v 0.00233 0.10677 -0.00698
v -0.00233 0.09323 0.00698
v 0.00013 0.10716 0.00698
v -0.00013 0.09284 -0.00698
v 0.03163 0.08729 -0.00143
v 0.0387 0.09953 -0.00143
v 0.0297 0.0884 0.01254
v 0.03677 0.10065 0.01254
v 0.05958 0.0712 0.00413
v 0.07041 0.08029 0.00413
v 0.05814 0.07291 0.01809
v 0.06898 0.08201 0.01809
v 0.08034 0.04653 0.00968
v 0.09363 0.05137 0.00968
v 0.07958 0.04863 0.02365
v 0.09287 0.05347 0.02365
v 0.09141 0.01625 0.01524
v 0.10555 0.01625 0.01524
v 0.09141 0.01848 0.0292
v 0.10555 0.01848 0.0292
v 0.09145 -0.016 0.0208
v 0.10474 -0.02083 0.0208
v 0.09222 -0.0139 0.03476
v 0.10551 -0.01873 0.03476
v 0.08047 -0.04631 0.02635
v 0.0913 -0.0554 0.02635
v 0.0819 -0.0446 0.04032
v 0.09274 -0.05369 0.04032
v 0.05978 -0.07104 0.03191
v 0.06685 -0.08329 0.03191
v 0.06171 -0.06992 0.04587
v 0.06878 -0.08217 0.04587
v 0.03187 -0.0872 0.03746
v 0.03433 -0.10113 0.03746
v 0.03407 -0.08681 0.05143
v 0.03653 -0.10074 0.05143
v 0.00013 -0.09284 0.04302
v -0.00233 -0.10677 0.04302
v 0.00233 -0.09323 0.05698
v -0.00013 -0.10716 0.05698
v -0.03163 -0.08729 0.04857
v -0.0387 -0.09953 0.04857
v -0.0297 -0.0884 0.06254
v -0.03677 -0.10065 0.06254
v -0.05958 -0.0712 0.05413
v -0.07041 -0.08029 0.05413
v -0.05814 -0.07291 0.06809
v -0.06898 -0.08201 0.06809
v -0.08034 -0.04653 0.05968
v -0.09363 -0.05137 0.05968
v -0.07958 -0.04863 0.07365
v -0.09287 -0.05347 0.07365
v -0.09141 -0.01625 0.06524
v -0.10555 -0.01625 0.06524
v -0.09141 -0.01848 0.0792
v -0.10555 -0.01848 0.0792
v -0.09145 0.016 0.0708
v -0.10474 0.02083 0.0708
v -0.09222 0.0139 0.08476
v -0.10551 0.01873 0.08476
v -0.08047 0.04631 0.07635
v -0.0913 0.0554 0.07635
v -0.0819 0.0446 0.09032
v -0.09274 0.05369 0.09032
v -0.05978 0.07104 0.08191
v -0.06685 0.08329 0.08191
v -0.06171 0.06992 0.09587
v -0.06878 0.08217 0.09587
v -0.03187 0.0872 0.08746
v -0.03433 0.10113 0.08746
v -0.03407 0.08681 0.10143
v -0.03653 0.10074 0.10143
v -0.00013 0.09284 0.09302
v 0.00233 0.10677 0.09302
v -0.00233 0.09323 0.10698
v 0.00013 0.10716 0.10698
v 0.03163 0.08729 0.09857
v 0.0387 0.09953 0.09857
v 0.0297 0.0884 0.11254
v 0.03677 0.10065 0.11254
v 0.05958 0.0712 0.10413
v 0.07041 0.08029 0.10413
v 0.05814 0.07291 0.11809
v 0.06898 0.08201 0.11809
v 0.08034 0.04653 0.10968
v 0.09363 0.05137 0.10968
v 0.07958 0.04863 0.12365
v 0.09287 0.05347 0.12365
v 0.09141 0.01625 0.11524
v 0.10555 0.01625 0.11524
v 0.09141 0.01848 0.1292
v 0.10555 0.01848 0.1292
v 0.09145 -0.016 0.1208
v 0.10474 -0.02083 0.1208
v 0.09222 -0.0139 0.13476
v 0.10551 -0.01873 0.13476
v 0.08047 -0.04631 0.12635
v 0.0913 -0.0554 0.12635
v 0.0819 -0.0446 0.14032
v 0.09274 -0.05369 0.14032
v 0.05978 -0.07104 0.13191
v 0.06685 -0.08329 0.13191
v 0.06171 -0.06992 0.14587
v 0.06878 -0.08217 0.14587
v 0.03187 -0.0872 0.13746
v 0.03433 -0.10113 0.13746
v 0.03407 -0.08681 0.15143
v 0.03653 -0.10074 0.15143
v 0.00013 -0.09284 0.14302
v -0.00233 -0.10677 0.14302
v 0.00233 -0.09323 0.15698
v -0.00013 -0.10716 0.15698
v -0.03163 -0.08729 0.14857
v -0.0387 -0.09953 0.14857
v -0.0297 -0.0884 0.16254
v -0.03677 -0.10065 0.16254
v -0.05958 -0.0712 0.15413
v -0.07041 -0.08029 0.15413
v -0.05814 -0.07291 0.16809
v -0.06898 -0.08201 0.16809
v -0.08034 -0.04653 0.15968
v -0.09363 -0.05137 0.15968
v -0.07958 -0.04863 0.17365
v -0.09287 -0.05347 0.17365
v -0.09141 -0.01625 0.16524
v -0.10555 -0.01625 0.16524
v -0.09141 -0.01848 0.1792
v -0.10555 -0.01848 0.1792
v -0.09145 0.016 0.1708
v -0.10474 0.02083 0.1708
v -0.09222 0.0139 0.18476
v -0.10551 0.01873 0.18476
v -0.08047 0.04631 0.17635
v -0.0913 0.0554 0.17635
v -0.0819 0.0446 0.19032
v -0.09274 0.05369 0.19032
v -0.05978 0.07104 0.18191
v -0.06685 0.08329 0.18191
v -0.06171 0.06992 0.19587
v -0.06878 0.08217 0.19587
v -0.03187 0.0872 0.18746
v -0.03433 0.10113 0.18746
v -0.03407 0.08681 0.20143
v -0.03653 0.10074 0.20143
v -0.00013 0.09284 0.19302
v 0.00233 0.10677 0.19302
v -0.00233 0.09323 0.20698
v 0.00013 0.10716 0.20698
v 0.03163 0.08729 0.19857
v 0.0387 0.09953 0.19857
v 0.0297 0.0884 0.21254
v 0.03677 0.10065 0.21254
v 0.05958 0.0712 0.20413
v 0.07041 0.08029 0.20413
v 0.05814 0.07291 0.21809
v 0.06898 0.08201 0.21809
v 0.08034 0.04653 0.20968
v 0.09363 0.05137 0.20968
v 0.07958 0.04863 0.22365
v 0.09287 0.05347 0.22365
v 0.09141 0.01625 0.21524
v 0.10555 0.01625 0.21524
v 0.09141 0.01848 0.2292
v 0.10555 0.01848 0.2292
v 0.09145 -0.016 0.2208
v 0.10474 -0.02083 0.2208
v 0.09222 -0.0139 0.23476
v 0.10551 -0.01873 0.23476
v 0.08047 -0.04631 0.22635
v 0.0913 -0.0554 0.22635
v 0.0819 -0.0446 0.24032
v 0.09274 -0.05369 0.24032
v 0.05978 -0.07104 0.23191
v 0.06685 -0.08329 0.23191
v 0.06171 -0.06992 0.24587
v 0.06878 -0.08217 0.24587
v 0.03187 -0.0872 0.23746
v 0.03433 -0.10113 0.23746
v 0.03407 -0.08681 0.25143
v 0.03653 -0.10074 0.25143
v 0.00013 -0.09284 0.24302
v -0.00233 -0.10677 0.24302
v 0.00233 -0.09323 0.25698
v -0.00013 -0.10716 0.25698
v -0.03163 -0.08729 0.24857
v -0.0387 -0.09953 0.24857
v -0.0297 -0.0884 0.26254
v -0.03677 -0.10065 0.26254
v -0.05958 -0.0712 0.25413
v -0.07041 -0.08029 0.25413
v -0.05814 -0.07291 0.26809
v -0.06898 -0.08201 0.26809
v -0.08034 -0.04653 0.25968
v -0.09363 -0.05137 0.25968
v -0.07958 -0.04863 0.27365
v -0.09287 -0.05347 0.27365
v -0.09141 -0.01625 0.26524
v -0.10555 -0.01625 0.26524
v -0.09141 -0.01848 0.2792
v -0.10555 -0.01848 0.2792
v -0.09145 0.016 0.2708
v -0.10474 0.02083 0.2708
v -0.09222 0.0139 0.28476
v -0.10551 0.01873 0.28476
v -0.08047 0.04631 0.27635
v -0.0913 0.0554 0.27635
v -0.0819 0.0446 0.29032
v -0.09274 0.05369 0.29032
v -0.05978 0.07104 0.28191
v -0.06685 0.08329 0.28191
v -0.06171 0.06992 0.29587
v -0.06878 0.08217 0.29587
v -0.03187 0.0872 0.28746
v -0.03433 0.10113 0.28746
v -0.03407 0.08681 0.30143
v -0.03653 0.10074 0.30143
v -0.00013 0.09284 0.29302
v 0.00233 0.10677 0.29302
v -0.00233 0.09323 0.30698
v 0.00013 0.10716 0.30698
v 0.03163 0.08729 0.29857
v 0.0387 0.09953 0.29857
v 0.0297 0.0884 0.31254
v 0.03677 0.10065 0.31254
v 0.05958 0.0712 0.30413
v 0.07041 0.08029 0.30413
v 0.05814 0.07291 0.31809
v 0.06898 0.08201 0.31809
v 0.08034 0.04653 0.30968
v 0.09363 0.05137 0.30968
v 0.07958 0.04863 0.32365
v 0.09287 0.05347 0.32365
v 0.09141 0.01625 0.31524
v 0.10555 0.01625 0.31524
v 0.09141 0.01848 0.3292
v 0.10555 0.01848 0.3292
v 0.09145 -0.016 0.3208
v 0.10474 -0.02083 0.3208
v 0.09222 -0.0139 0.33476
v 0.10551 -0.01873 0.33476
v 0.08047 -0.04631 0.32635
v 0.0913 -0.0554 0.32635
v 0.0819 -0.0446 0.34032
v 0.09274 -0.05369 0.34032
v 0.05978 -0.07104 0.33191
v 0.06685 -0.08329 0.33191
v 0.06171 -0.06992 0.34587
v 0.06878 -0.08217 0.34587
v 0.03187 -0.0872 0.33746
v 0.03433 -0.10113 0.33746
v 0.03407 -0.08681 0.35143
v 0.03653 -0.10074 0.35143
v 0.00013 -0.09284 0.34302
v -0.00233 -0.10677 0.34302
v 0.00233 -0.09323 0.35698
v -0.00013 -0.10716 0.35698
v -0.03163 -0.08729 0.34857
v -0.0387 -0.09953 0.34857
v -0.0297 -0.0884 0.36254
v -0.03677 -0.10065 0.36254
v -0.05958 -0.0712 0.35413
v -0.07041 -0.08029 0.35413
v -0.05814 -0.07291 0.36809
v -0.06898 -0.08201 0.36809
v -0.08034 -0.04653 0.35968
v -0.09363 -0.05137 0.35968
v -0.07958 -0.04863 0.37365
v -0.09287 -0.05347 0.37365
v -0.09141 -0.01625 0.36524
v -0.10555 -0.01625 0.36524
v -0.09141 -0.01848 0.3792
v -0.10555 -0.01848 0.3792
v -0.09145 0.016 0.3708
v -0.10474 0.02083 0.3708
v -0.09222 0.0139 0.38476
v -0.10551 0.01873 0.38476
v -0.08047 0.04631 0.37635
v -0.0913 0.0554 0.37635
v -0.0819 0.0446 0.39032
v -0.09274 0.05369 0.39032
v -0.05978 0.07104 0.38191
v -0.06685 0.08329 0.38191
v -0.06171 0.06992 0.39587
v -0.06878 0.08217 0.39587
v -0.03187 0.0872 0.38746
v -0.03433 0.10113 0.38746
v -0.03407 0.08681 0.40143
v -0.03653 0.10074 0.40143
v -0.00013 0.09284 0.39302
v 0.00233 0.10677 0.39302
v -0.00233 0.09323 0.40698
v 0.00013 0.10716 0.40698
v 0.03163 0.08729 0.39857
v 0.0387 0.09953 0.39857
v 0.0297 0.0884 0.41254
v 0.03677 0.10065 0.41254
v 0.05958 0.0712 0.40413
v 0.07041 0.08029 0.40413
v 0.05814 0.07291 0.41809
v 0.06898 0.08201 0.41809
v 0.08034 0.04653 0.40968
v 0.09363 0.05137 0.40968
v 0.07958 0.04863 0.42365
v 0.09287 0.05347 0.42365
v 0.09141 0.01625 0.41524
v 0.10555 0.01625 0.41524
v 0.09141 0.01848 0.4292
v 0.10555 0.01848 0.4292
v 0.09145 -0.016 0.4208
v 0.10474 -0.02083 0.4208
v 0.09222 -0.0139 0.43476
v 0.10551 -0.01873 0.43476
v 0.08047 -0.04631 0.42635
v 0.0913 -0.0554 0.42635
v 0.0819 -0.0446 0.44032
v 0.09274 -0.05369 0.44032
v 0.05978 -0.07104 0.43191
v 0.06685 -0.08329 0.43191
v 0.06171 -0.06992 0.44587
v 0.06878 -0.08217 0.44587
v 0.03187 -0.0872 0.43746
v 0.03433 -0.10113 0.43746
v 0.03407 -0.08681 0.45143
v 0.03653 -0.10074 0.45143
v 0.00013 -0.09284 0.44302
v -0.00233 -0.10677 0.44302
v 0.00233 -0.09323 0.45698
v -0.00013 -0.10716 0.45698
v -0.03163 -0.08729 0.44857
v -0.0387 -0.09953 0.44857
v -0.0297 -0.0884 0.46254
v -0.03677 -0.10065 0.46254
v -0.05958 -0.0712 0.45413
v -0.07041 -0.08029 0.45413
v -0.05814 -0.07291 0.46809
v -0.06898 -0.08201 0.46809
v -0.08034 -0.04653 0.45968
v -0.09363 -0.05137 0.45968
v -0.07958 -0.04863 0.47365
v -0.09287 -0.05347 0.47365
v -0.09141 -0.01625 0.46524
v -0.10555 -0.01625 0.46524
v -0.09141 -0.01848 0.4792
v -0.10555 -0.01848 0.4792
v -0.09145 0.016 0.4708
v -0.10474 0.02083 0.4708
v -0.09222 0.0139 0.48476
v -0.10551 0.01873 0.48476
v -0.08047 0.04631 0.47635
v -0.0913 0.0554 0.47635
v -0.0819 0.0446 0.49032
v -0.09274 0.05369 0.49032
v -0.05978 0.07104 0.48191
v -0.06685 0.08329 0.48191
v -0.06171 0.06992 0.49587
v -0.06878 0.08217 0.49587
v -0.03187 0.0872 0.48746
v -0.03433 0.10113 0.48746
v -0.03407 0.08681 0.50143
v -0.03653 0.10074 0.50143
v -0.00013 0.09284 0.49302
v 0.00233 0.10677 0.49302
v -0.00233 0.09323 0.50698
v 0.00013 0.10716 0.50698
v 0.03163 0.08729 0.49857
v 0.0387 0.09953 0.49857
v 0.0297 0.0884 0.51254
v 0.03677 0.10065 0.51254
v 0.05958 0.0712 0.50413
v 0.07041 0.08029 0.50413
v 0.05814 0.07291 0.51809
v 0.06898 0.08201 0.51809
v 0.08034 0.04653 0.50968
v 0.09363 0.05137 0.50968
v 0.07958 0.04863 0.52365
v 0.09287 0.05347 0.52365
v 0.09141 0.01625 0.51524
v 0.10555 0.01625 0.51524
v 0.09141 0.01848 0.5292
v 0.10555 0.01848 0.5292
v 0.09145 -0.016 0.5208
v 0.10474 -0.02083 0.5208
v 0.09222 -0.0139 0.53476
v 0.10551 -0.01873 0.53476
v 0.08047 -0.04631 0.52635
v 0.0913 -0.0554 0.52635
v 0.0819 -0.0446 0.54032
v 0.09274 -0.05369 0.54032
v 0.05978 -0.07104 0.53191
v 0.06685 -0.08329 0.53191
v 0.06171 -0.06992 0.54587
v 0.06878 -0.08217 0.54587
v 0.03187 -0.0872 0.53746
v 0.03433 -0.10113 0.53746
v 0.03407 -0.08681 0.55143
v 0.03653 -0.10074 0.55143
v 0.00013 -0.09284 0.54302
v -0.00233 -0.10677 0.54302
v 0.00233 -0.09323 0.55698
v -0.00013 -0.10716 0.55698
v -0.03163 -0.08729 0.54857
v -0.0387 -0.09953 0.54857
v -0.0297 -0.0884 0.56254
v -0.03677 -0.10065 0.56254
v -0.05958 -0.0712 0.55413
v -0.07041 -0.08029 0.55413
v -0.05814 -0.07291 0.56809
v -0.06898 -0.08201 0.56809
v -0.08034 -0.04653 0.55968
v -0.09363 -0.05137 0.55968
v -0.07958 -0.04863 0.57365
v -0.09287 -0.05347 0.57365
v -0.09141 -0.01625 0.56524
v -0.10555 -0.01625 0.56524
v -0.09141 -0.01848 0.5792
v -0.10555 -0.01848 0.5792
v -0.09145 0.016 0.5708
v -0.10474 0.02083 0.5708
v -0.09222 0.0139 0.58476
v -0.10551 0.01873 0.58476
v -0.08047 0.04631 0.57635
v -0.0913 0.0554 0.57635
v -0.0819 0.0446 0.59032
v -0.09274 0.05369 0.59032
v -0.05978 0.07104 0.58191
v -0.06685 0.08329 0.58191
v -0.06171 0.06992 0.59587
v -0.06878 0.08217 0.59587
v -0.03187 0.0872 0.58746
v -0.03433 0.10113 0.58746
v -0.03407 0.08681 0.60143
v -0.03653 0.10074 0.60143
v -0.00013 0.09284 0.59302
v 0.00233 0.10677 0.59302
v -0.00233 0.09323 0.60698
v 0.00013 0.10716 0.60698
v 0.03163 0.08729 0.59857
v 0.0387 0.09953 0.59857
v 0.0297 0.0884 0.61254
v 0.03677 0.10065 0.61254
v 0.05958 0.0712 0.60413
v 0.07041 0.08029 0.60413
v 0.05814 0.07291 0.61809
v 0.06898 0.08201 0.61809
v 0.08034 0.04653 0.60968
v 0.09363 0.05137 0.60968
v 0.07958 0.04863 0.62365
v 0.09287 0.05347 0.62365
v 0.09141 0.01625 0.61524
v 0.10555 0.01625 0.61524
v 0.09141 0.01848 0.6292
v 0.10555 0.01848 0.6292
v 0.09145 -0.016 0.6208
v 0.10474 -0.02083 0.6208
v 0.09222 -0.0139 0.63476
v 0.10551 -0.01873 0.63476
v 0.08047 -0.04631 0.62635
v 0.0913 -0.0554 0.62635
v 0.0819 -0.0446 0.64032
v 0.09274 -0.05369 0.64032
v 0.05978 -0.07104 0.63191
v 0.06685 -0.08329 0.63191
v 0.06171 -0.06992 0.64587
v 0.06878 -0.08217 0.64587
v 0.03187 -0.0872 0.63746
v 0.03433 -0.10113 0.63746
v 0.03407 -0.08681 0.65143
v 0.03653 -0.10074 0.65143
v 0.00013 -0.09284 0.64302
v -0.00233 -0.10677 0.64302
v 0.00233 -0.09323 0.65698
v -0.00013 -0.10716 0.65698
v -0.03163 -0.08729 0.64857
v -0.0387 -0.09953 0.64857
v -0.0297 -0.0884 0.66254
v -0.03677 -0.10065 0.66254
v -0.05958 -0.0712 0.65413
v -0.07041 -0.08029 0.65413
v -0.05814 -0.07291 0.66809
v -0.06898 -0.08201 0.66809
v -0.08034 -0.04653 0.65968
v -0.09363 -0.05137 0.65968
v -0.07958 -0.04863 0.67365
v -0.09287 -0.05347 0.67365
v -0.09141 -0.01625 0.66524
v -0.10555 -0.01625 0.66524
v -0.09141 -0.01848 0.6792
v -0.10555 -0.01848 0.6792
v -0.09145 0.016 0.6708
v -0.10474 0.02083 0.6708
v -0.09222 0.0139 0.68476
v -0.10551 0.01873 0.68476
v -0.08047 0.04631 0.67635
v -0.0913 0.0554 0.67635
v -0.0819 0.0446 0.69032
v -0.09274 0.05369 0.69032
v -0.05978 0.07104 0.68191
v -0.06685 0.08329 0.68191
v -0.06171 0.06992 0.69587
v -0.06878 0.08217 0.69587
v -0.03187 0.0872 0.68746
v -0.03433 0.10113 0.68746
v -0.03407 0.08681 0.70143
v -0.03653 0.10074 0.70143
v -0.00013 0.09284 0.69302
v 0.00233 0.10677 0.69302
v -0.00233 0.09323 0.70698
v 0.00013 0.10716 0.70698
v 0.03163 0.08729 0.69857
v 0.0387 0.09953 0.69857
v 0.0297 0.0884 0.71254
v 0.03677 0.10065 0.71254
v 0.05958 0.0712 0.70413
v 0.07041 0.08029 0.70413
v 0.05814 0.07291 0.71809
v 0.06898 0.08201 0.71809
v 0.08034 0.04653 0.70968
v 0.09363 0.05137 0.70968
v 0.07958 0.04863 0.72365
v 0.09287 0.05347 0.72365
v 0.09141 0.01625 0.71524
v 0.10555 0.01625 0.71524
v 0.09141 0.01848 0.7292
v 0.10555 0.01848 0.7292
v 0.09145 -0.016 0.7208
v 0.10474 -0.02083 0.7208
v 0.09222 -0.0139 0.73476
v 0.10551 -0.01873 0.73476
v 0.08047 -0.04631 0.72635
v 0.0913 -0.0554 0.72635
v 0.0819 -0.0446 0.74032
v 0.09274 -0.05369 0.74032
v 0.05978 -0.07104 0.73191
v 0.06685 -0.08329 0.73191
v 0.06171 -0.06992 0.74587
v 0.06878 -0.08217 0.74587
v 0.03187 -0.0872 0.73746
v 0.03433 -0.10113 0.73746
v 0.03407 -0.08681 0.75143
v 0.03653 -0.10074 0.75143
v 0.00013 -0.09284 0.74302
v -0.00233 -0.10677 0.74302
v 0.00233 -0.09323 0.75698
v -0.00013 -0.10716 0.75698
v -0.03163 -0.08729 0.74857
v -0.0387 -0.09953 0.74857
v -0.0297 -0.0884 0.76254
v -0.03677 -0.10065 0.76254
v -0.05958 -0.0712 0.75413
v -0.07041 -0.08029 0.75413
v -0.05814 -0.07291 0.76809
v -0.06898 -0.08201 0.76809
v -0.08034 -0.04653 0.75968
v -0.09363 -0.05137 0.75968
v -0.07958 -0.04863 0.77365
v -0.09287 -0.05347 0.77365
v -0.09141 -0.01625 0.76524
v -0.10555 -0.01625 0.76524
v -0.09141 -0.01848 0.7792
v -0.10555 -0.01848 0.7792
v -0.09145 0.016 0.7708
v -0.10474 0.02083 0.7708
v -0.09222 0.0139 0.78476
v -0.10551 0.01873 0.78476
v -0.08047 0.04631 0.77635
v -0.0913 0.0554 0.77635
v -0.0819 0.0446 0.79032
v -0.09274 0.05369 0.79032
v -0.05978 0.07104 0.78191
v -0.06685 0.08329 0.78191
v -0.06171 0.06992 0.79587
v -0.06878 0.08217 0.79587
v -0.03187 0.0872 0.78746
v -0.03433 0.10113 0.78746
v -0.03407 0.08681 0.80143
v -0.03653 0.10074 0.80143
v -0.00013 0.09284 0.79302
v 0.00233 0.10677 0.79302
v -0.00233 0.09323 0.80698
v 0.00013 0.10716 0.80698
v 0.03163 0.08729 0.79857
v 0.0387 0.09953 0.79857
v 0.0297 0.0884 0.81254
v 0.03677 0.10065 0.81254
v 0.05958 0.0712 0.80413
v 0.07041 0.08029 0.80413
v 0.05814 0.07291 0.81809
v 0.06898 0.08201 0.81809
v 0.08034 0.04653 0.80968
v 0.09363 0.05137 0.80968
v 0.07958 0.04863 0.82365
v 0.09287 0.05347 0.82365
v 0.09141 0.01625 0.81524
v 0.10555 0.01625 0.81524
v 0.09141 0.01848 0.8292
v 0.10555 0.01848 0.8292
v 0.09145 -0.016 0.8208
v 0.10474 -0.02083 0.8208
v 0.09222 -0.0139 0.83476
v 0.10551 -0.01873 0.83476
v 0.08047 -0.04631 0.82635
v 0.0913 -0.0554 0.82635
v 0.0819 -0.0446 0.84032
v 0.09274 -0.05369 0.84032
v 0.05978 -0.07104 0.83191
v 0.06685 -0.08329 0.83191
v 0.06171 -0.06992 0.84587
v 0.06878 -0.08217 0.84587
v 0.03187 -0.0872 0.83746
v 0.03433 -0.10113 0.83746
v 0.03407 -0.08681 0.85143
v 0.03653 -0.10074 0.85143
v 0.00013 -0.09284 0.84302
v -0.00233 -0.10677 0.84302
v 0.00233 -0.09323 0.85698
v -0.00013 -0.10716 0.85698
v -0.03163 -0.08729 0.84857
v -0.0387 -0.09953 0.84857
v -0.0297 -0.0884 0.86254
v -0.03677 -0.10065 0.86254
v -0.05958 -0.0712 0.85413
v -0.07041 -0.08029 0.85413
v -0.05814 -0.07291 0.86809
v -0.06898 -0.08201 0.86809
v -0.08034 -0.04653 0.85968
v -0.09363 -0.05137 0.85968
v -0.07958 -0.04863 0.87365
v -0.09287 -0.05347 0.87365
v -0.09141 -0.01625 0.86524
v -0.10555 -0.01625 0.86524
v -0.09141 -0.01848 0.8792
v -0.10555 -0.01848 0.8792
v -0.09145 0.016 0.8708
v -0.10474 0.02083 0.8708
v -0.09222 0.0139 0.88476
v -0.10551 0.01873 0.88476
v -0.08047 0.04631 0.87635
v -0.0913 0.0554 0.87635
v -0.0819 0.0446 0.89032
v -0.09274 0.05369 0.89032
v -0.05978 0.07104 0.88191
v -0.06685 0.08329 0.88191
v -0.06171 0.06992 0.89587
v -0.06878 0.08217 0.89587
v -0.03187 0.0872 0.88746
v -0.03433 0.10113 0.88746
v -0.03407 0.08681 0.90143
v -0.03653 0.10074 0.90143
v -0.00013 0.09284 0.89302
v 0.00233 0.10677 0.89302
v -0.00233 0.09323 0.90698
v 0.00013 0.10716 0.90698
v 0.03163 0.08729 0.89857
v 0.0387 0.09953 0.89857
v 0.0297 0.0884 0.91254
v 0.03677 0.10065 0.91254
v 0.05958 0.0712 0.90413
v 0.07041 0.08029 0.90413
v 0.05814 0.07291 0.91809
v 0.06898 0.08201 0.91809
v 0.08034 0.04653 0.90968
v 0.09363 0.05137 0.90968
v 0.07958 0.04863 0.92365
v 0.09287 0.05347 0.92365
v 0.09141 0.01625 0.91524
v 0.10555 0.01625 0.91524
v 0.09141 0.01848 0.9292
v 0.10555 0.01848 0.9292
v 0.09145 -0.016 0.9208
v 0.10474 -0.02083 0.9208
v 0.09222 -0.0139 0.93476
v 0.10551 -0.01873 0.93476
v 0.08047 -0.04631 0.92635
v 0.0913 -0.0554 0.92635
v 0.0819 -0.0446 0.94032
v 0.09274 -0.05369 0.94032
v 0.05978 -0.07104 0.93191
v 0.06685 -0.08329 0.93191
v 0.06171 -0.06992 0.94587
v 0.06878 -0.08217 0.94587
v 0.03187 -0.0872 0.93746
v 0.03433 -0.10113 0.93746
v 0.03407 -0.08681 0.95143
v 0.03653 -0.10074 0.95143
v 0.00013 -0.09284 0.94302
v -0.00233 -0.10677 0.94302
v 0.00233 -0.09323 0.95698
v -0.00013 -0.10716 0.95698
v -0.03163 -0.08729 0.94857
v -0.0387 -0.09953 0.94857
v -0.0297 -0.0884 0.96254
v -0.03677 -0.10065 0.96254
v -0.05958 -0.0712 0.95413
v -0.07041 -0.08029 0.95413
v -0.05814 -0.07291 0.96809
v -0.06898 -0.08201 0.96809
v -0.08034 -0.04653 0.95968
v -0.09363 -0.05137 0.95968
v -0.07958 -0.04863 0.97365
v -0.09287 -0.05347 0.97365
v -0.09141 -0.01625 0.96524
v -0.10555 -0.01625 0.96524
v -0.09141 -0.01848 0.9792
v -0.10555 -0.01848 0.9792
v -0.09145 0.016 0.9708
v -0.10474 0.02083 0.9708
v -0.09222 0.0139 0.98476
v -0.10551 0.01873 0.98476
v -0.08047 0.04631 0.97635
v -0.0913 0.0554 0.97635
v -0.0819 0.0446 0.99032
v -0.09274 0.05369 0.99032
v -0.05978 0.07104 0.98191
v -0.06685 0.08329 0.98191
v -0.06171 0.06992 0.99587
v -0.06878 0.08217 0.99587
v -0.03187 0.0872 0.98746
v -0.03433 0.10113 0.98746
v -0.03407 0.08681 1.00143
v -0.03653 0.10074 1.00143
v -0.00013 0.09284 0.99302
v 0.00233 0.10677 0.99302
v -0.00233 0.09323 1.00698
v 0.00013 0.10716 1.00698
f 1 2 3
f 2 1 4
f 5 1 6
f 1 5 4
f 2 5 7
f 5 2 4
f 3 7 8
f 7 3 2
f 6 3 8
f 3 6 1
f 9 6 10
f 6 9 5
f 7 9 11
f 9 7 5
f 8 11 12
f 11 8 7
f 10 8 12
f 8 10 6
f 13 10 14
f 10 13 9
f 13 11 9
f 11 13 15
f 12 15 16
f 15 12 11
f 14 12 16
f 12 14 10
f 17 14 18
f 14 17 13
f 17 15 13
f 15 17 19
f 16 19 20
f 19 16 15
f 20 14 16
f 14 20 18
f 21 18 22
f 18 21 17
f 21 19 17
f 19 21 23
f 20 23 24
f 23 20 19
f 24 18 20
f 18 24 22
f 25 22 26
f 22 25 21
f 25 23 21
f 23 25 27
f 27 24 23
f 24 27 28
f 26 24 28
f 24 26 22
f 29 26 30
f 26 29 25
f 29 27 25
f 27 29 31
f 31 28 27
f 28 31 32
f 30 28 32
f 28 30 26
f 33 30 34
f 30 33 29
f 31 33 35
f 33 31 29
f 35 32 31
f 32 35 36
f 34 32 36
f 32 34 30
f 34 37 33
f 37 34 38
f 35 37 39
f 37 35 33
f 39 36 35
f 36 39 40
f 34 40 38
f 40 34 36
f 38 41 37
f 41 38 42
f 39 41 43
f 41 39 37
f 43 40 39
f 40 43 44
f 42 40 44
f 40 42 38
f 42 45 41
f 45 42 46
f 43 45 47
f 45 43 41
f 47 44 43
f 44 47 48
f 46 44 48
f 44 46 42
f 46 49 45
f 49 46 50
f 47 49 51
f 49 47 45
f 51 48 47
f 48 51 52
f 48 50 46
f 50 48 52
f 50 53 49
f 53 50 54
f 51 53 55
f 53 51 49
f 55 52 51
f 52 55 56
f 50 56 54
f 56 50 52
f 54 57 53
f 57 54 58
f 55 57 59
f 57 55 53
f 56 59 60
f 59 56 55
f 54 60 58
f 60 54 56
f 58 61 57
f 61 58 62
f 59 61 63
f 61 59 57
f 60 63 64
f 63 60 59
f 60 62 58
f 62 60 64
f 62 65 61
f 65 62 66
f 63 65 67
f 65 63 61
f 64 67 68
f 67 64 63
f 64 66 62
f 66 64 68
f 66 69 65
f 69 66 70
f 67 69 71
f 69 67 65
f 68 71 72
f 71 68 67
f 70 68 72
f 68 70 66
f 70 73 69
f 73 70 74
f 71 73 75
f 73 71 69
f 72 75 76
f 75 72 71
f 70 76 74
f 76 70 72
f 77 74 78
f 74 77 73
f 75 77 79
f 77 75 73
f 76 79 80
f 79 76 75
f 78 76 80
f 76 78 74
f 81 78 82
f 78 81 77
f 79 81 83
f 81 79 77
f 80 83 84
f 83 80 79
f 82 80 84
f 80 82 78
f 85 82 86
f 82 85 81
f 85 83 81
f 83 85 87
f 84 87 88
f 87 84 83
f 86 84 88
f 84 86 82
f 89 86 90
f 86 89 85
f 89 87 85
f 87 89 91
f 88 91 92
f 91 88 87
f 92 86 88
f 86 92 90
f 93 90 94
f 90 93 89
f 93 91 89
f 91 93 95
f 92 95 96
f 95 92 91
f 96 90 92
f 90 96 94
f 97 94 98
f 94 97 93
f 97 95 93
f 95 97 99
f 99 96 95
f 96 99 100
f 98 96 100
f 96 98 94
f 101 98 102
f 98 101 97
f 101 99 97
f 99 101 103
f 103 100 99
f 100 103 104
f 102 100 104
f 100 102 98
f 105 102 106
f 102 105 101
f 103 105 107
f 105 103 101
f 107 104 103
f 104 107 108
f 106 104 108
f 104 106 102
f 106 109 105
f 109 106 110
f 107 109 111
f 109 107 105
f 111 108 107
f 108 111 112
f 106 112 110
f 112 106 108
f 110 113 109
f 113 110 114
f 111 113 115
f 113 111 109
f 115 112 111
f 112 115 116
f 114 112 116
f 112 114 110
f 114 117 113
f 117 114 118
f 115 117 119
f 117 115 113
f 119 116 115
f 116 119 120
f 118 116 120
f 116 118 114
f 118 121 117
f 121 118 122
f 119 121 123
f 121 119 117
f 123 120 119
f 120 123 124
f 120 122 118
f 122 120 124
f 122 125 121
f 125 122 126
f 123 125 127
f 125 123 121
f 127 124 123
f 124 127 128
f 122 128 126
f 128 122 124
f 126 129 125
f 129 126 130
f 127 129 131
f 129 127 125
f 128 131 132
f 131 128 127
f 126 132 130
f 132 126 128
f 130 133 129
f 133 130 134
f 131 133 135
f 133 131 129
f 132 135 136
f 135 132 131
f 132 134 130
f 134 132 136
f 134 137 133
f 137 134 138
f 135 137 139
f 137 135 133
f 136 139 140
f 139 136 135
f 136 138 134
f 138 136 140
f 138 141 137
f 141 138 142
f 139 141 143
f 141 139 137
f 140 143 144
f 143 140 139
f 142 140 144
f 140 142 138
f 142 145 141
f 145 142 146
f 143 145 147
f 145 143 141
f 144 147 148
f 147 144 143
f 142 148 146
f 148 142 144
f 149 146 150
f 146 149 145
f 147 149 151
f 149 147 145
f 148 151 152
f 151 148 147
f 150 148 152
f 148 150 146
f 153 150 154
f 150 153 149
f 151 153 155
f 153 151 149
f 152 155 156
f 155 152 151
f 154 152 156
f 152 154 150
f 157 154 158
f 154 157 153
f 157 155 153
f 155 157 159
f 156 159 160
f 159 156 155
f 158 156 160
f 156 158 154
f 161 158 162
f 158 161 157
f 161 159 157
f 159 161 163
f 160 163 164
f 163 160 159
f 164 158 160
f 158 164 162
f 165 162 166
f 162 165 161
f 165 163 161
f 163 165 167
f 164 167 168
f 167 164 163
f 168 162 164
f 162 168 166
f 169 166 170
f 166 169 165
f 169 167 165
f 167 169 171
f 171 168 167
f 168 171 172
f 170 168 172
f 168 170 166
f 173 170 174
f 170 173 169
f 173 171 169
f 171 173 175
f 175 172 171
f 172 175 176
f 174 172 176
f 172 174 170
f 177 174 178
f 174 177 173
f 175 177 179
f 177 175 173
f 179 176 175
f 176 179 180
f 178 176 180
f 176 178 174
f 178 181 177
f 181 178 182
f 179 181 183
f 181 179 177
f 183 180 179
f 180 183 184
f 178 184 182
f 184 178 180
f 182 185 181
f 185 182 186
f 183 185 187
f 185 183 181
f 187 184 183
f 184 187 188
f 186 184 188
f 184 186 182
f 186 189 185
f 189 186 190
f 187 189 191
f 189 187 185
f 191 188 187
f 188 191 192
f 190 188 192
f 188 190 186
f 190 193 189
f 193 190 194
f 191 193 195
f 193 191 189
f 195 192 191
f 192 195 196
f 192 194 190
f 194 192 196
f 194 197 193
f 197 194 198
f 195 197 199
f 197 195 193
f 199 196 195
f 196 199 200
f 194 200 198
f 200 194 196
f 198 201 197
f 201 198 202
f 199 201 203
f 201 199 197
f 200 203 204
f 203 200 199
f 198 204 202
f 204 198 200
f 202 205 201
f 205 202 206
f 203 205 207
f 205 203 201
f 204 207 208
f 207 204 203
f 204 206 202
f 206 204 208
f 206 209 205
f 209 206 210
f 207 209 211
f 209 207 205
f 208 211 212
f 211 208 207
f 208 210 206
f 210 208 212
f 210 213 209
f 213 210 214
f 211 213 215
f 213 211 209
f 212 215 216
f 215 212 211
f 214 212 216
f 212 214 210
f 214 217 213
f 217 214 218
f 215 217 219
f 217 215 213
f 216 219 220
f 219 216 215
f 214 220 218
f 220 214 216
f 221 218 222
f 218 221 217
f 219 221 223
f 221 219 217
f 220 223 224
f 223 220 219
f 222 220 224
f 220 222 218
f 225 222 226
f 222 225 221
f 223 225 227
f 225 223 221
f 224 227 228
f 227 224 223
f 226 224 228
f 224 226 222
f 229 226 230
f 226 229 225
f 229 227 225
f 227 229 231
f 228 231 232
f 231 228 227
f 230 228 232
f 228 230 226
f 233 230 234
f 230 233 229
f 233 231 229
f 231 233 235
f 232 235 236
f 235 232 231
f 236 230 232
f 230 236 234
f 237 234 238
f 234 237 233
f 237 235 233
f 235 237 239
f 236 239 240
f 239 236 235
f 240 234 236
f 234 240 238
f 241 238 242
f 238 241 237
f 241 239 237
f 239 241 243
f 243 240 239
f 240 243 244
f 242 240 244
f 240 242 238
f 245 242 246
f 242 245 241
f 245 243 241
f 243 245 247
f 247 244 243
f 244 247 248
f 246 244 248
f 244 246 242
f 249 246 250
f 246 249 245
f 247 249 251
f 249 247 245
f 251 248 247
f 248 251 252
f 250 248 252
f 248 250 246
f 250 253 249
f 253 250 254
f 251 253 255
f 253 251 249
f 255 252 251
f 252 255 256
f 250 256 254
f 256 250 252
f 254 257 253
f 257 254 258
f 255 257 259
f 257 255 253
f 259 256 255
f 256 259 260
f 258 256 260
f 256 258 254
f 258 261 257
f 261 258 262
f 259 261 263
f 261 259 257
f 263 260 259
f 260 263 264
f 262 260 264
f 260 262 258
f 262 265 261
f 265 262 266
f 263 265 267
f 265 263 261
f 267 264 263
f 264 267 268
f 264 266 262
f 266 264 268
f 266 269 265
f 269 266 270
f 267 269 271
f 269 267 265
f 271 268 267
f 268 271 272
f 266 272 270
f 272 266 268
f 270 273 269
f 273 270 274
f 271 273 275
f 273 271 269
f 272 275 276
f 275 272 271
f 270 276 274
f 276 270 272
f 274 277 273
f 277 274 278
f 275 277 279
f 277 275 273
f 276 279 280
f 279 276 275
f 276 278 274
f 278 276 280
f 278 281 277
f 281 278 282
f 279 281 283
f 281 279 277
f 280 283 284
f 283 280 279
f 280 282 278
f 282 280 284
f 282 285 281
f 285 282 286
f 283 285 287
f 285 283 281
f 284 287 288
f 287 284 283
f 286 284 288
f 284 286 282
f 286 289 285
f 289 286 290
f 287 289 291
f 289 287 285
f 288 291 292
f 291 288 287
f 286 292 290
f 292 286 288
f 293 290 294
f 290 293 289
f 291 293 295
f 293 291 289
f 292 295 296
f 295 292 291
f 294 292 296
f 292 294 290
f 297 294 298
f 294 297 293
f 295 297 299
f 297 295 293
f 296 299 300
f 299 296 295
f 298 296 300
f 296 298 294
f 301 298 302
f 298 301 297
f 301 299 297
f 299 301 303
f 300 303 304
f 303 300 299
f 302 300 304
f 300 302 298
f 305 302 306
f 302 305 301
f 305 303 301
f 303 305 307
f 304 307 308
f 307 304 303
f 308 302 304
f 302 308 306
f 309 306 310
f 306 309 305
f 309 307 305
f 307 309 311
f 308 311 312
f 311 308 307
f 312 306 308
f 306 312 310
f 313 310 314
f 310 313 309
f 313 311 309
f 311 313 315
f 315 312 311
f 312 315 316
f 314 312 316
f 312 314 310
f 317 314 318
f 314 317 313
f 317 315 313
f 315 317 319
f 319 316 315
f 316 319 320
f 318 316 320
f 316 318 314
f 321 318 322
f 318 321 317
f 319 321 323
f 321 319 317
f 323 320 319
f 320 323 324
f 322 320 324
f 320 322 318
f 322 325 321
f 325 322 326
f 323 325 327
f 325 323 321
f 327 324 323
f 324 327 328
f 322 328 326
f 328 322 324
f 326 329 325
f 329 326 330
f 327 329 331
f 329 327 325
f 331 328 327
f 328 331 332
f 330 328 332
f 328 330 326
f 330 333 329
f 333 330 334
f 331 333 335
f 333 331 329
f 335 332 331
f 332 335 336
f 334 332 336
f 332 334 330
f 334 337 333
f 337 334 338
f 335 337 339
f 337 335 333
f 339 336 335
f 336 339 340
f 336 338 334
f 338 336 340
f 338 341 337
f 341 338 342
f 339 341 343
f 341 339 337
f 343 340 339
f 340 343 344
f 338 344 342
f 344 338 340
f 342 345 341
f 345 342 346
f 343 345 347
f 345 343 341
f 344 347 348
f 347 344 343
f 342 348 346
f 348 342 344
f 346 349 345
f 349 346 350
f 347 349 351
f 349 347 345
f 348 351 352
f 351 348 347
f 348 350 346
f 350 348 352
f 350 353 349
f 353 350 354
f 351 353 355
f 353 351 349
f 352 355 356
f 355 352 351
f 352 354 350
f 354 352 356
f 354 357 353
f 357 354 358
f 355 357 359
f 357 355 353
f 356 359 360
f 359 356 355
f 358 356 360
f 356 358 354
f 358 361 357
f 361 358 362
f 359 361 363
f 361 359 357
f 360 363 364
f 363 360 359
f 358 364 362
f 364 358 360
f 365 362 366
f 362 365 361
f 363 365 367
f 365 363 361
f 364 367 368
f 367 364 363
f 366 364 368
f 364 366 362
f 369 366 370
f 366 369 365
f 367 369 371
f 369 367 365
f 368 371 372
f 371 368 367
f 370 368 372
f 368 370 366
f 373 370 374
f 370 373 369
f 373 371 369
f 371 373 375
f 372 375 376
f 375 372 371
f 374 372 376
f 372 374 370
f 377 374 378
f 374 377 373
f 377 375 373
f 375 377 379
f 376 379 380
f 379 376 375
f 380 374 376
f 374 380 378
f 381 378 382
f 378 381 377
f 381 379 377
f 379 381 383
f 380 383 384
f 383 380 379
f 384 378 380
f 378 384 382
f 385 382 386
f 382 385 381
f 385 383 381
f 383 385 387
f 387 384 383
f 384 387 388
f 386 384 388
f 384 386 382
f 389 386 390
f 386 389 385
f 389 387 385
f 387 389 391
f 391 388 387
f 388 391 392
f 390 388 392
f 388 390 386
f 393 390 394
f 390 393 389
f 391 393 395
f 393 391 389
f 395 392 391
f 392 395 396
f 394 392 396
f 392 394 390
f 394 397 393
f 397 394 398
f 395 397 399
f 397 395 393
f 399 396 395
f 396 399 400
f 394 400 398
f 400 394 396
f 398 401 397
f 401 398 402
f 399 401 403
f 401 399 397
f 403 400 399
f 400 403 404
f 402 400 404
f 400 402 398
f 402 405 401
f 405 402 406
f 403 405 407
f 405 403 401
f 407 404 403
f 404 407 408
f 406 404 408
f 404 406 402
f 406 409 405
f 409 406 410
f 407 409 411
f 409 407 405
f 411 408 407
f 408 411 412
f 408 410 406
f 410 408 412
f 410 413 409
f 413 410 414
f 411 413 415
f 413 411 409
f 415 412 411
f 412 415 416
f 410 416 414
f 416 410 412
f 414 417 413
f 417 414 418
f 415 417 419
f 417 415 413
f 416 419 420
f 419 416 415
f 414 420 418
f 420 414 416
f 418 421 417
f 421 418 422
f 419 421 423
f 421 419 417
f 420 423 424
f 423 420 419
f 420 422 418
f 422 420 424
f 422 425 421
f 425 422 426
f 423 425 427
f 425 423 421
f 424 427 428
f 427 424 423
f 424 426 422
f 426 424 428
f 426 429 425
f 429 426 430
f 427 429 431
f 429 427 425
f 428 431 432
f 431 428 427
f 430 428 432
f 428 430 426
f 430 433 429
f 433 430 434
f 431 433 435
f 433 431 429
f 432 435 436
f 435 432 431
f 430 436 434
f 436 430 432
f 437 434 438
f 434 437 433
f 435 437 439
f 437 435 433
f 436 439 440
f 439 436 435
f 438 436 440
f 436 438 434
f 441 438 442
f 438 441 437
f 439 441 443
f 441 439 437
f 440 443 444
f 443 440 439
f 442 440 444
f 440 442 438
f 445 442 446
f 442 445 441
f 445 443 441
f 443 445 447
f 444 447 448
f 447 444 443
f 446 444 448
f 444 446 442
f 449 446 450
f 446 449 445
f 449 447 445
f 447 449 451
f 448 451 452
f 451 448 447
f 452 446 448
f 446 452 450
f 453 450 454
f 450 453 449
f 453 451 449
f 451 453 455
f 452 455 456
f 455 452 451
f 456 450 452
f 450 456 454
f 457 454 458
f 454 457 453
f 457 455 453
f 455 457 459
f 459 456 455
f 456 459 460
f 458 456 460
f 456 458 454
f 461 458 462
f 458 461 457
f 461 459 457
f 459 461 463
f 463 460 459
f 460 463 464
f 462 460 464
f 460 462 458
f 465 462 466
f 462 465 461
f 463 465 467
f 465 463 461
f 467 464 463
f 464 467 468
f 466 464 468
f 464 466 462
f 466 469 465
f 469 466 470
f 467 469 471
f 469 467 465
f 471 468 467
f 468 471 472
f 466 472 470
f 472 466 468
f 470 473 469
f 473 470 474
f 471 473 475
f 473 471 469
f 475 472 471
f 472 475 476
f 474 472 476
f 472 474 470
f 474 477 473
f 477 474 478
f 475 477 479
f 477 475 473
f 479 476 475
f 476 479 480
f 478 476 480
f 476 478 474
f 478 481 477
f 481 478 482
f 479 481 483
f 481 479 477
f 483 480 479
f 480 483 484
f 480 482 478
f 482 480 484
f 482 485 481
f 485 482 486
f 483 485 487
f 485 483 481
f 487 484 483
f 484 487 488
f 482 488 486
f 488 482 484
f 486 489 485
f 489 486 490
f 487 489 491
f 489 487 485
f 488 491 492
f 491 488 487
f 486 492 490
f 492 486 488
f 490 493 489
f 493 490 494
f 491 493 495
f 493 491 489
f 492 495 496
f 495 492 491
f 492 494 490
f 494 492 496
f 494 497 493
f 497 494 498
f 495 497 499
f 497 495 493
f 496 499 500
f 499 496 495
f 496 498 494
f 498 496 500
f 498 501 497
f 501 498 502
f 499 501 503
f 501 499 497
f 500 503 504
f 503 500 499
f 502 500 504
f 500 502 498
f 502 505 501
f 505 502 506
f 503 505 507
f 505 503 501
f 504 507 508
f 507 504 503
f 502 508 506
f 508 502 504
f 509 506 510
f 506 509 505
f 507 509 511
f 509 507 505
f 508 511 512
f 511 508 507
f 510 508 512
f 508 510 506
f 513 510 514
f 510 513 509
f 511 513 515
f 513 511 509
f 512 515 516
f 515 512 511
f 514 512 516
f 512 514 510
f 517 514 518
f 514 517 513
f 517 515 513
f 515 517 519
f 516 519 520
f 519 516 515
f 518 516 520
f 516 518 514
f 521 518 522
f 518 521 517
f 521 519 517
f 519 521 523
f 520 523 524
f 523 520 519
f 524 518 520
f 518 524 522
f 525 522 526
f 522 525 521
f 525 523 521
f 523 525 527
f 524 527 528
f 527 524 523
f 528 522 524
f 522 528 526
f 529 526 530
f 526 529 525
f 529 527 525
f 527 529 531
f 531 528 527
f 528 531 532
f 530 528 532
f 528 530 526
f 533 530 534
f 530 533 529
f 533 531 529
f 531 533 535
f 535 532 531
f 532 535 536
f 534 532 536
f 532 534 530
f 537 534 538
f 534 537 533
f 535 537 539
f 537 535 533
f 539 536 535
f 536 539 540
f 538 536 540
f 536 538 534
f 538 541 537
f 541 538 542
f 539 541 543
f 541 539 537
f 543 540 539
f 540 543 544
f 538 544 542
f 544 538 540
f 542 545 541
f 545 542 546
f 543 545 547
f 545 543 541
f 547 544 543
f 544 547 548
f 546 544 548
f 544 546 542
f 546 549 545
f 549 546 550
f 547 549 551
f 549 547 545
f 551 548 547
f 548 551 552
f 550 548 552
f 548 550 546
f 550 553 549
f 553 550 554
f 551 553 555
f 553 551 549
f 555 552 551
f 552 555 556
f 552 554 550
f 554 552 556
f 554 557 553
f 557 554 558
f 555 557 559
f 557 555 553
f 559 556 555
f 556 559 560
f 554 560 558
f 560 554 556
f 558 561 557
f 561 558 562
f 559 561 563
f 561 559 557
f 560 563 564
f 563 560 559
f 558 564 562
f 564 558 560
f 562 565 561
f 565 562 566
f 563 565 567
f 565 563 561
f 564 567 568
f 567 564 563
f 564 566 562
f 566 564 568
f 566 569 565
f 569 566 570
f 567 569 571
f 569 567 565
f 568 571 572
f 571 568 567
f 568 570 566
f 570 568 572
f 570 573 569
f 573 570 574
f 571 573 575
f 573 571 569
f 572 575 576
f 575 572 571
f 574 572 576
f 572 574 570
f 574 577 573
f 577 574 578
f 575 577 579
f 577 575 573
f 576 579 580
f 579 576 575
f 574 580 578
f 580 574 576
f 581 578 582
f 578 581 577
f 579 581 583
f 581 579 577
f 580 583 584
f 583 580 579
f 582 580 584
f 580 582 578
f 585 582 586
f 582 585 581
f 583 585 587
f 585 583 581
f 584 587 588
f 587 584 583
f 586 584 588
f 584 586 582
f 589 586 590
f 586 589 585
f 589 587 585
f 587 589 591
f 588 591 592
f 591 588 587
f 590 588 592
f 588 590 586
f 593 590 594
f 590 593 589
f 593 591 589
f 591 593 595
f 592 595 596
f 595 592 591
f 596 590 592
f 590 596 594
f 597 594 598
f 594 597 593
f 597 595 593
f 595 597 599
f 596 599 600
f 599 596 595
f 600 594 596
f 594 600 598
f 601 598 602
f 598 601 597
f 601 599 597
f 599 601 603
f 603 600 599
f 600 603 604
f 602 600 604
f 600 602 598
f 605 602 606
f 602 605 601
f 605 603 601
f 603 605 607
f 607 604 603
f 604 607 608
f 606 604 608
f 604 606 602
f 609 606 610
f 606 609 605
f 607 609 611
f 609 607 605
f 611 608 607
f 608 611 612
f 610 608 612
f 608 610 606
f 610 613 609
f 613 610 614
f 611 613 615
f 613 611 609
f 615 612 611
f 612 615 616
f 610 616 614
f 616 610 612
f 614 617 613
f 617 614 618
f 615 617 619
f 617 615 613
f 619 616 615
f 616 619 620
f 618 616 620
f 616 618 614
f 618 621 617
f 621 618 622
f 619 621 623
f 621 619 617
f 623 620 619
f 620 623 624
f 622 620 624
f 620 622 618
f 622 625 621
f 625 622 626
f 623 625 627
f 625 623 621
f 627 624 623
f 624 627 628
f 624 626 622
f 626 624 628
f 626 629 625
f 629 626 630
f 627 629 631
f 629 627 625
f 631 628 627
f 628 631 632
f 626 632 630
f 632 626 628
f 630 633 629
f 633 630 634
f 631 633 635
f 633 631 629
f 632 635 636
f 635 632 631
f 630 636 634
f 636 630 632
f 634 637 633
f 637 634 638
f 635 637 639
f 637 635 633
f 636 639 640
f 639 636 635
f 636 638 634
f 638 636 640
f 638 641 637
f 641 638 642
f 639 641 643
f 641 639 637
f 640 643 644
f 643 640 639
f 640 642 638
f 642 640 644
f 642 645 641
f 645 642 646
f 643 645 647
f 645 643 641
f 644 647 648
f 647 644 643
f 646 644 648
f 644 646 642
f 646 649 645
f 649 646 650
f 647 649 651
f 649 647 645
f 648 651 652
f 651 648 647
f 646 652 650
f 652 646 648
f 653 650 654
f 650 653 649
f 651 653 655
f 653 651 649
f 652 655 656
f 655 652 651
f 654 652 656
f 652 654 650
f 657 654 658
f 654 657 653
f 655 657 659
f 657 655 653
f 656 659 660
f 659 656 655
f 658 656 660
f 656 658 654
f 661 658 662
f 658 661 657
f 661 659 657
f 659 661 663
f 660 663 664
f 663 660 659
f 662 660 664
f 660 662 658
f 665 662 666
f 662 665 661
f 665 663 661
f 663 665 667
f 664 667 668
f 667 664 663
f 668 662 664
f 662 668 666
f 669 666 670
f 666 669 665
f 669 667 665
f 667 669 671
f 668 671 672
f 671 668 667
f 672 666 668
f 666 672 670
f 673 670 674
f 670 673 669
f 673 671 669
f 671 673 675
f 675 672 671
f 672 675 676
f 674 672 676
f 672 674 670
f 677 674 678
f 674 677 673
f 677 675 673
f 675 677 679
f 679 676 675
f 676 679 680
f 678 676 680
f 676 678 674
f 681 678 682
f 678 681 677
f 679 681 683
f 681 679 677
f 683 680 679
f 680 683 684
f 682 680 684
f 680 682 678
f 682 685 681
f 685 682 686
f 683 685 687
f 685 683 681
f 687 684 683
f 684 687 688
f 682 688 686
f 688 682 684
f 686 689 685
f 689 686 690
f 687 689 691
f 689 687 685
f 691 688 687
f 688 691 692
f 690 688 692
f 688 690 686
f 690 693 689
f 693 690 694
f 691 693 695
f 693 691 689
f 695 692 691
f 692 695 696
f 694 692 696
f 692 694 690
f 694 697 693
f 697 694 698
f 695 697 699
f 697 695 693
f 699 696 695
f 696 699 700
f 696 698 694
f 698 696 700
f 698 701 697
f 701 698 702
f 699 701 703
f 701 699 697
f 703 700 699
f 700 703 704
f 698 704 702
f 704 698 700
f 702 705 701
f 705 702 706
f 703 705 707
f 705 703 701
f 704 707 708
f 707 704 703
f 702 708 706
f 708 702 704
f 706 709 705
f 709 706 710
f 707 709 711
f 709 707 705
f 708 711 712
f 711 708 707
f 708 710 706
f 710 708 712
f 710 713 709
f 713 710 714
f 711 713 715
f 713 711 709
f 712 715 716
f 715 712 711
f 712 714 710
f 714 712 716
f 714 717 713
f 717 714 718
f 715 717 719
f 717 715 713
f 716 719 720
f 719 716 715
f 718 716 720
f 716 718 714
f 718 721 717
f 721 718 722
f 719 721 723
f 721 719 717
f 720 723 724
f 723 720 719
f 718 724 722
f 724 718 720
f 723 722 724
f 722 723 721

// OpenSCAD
// tube example - a spring
// orginal endless tube code by nop head
// requires openscad snapshot  eg.
//      http://files.openscad.org/OpenSCAD-2014.01.14-x86-32-Installer.exe
// with concat enabled  in edit/preferences/features 

height=1;

// radius of spring
Radius= 0.1;

// radius of wire 
Wire_radius=Radius*0.1;

//number of coils
Coils = 10;

// Pitch of spring - distance between coils
Pitch= height/Coils;

// Spring Resolution - in degrees
Step=20;

// Wire resolution
$fn= 4;

function m_translate(v) = [ [1, 0, 0, 0],
                            [0, 1, 0, 0],
                            [0, 0, 1, 0],
                            [v.x, v.y, v.z, 1  ] ];
                            
function m_rotate(v) =  [ [1,  0,         0,        0],
                          [0,  cos(v.x),  sin(v.x), 0],
                          [0, -sin(v.x),  cos(v.x), 0],
                          [0,  0,         0,        1] ]
                      * [ [ cos(v.y), 0,  -sin(v.y), 0],
                          [0,         1,  0,        0],
                          [ sin(v.y), 0,  cos(v.y), 0],
                          [0,         0,  0,        1] ]
                      * [ [ cos(v.z),  sin(v.z), 0, 0],
                          [-sin(v.z),  cos(v.z), 0, 0],
                          [ 0,         0,        1, 0],
                          [ 0,         0,        0, 1] ];
                            
function vec3(v) = [v.x, v.y, v.z];
function transform(v, m)  = vec3([v.x, v.y, v.z, 1] * m);
                            
function orientate(p0, p) =               
              m_rotate([0, atan2(sqrt(pow(p[0], 2) + pow(p[1], 2)), p[2]), 0])  
            * m_rotate([0, 0, atan2(p[1], p[0])]) 
            * m_translate(p0);

function circle_points(r = 1, a = 0) = 
    a < 360
       ? concat([[r * sin(a),  r * cos(a),0]], circle_points(r, a + 360 / ($fn+1))) 
       : [] ;

function loop_points(step, end , t = 0) = 
    t <= end 
       ? concat([f(t)], loop_points(step, end, t + step)) 
       : [] ;

function transform_points(list, matrix, i = 0) = 
    i < len(list) 
       ? concat([ transform(list[i], matrix) ], transform_points(list, matrix, i + 1))
       : [];

function tube_points(loop_points, section_points, i=0) =
    i < len(loop_points)-1
       ? concat(
           transform_points(
                 section_points, 
                 orientate(loop_points[i],(loop_points[i + 1]- loop_points[i])/2)),
          tube_points(loop_points,section_points, i + 1)
        )
       : []    // in a closed loop, this segment connects to the start
;

function tube_faces(facets, s, i = 0) =  
     i < facets  
       ?  concat([[s * facets + i, 
                   s * facets + (i + 1) % facets, 
                  (s + 1) * facets + (i + 1) % facets, 
                  (s + 1) * facets + i]
                ], 
                tube_faces(facets, s, i + 1))
      : [];
          
function tube_end(facets, s, i = 0) =  
     i < facets  
       ?  concat( [s * facets + i], tube_end(facets, s, i+1))
       : [];  
 
                                       
function loop_faces(segs,facets, j = 0) = 
     j < segs
        ? concat(tube_faces(facets,  j), loop_faces(segs, facets, j + 1)) 
        : [];

function loop_all_faces(segs,facets) =
     concat ([reverse(tube_end(facets,0))], // direction changed here 
              loop_faces(segs,facets),
             [tube_end(facets,segs)]
            );

function reverse_r(v,n) =
      n == 0 
        ? [v[0]]
        : concat([v[n]],reverse_r(v,n-1))
;
function reverse(v) = reverse_r(v, len(v)-1);


function circle_points(r = 1, a = 0) = 
    a < 360
       ? concat([[r * sin(a),  r * cos(a),0]], circle_points(r, a + 360 / $fn)) 
       : [] ;

function f(t) =  [Radius *sin(t),Radius * cos(t) ,Pitch * t/360 ];

function loop_points(step, end, t = 0) = 
    t <= end 
       ? concat([f(t)], loop_points(step, end, t + step )) 
       : [] ;

//section_points = circle_points(Wire_radius, $fn=20);
section_points = circle_points(Wire_radius, 45);
//echo(section_points);

loop_points = loop_points(Step ,360* Coils + Step);
// echo(loop_points);
tube_points = tube_points(loop_points,section_points);
// echo(tube_points);

faces = loop_all_faces(len(loop_points)-2, len(section_points));
 //echo(faces);
polyhedron(points = tube_points, faces = faces);
